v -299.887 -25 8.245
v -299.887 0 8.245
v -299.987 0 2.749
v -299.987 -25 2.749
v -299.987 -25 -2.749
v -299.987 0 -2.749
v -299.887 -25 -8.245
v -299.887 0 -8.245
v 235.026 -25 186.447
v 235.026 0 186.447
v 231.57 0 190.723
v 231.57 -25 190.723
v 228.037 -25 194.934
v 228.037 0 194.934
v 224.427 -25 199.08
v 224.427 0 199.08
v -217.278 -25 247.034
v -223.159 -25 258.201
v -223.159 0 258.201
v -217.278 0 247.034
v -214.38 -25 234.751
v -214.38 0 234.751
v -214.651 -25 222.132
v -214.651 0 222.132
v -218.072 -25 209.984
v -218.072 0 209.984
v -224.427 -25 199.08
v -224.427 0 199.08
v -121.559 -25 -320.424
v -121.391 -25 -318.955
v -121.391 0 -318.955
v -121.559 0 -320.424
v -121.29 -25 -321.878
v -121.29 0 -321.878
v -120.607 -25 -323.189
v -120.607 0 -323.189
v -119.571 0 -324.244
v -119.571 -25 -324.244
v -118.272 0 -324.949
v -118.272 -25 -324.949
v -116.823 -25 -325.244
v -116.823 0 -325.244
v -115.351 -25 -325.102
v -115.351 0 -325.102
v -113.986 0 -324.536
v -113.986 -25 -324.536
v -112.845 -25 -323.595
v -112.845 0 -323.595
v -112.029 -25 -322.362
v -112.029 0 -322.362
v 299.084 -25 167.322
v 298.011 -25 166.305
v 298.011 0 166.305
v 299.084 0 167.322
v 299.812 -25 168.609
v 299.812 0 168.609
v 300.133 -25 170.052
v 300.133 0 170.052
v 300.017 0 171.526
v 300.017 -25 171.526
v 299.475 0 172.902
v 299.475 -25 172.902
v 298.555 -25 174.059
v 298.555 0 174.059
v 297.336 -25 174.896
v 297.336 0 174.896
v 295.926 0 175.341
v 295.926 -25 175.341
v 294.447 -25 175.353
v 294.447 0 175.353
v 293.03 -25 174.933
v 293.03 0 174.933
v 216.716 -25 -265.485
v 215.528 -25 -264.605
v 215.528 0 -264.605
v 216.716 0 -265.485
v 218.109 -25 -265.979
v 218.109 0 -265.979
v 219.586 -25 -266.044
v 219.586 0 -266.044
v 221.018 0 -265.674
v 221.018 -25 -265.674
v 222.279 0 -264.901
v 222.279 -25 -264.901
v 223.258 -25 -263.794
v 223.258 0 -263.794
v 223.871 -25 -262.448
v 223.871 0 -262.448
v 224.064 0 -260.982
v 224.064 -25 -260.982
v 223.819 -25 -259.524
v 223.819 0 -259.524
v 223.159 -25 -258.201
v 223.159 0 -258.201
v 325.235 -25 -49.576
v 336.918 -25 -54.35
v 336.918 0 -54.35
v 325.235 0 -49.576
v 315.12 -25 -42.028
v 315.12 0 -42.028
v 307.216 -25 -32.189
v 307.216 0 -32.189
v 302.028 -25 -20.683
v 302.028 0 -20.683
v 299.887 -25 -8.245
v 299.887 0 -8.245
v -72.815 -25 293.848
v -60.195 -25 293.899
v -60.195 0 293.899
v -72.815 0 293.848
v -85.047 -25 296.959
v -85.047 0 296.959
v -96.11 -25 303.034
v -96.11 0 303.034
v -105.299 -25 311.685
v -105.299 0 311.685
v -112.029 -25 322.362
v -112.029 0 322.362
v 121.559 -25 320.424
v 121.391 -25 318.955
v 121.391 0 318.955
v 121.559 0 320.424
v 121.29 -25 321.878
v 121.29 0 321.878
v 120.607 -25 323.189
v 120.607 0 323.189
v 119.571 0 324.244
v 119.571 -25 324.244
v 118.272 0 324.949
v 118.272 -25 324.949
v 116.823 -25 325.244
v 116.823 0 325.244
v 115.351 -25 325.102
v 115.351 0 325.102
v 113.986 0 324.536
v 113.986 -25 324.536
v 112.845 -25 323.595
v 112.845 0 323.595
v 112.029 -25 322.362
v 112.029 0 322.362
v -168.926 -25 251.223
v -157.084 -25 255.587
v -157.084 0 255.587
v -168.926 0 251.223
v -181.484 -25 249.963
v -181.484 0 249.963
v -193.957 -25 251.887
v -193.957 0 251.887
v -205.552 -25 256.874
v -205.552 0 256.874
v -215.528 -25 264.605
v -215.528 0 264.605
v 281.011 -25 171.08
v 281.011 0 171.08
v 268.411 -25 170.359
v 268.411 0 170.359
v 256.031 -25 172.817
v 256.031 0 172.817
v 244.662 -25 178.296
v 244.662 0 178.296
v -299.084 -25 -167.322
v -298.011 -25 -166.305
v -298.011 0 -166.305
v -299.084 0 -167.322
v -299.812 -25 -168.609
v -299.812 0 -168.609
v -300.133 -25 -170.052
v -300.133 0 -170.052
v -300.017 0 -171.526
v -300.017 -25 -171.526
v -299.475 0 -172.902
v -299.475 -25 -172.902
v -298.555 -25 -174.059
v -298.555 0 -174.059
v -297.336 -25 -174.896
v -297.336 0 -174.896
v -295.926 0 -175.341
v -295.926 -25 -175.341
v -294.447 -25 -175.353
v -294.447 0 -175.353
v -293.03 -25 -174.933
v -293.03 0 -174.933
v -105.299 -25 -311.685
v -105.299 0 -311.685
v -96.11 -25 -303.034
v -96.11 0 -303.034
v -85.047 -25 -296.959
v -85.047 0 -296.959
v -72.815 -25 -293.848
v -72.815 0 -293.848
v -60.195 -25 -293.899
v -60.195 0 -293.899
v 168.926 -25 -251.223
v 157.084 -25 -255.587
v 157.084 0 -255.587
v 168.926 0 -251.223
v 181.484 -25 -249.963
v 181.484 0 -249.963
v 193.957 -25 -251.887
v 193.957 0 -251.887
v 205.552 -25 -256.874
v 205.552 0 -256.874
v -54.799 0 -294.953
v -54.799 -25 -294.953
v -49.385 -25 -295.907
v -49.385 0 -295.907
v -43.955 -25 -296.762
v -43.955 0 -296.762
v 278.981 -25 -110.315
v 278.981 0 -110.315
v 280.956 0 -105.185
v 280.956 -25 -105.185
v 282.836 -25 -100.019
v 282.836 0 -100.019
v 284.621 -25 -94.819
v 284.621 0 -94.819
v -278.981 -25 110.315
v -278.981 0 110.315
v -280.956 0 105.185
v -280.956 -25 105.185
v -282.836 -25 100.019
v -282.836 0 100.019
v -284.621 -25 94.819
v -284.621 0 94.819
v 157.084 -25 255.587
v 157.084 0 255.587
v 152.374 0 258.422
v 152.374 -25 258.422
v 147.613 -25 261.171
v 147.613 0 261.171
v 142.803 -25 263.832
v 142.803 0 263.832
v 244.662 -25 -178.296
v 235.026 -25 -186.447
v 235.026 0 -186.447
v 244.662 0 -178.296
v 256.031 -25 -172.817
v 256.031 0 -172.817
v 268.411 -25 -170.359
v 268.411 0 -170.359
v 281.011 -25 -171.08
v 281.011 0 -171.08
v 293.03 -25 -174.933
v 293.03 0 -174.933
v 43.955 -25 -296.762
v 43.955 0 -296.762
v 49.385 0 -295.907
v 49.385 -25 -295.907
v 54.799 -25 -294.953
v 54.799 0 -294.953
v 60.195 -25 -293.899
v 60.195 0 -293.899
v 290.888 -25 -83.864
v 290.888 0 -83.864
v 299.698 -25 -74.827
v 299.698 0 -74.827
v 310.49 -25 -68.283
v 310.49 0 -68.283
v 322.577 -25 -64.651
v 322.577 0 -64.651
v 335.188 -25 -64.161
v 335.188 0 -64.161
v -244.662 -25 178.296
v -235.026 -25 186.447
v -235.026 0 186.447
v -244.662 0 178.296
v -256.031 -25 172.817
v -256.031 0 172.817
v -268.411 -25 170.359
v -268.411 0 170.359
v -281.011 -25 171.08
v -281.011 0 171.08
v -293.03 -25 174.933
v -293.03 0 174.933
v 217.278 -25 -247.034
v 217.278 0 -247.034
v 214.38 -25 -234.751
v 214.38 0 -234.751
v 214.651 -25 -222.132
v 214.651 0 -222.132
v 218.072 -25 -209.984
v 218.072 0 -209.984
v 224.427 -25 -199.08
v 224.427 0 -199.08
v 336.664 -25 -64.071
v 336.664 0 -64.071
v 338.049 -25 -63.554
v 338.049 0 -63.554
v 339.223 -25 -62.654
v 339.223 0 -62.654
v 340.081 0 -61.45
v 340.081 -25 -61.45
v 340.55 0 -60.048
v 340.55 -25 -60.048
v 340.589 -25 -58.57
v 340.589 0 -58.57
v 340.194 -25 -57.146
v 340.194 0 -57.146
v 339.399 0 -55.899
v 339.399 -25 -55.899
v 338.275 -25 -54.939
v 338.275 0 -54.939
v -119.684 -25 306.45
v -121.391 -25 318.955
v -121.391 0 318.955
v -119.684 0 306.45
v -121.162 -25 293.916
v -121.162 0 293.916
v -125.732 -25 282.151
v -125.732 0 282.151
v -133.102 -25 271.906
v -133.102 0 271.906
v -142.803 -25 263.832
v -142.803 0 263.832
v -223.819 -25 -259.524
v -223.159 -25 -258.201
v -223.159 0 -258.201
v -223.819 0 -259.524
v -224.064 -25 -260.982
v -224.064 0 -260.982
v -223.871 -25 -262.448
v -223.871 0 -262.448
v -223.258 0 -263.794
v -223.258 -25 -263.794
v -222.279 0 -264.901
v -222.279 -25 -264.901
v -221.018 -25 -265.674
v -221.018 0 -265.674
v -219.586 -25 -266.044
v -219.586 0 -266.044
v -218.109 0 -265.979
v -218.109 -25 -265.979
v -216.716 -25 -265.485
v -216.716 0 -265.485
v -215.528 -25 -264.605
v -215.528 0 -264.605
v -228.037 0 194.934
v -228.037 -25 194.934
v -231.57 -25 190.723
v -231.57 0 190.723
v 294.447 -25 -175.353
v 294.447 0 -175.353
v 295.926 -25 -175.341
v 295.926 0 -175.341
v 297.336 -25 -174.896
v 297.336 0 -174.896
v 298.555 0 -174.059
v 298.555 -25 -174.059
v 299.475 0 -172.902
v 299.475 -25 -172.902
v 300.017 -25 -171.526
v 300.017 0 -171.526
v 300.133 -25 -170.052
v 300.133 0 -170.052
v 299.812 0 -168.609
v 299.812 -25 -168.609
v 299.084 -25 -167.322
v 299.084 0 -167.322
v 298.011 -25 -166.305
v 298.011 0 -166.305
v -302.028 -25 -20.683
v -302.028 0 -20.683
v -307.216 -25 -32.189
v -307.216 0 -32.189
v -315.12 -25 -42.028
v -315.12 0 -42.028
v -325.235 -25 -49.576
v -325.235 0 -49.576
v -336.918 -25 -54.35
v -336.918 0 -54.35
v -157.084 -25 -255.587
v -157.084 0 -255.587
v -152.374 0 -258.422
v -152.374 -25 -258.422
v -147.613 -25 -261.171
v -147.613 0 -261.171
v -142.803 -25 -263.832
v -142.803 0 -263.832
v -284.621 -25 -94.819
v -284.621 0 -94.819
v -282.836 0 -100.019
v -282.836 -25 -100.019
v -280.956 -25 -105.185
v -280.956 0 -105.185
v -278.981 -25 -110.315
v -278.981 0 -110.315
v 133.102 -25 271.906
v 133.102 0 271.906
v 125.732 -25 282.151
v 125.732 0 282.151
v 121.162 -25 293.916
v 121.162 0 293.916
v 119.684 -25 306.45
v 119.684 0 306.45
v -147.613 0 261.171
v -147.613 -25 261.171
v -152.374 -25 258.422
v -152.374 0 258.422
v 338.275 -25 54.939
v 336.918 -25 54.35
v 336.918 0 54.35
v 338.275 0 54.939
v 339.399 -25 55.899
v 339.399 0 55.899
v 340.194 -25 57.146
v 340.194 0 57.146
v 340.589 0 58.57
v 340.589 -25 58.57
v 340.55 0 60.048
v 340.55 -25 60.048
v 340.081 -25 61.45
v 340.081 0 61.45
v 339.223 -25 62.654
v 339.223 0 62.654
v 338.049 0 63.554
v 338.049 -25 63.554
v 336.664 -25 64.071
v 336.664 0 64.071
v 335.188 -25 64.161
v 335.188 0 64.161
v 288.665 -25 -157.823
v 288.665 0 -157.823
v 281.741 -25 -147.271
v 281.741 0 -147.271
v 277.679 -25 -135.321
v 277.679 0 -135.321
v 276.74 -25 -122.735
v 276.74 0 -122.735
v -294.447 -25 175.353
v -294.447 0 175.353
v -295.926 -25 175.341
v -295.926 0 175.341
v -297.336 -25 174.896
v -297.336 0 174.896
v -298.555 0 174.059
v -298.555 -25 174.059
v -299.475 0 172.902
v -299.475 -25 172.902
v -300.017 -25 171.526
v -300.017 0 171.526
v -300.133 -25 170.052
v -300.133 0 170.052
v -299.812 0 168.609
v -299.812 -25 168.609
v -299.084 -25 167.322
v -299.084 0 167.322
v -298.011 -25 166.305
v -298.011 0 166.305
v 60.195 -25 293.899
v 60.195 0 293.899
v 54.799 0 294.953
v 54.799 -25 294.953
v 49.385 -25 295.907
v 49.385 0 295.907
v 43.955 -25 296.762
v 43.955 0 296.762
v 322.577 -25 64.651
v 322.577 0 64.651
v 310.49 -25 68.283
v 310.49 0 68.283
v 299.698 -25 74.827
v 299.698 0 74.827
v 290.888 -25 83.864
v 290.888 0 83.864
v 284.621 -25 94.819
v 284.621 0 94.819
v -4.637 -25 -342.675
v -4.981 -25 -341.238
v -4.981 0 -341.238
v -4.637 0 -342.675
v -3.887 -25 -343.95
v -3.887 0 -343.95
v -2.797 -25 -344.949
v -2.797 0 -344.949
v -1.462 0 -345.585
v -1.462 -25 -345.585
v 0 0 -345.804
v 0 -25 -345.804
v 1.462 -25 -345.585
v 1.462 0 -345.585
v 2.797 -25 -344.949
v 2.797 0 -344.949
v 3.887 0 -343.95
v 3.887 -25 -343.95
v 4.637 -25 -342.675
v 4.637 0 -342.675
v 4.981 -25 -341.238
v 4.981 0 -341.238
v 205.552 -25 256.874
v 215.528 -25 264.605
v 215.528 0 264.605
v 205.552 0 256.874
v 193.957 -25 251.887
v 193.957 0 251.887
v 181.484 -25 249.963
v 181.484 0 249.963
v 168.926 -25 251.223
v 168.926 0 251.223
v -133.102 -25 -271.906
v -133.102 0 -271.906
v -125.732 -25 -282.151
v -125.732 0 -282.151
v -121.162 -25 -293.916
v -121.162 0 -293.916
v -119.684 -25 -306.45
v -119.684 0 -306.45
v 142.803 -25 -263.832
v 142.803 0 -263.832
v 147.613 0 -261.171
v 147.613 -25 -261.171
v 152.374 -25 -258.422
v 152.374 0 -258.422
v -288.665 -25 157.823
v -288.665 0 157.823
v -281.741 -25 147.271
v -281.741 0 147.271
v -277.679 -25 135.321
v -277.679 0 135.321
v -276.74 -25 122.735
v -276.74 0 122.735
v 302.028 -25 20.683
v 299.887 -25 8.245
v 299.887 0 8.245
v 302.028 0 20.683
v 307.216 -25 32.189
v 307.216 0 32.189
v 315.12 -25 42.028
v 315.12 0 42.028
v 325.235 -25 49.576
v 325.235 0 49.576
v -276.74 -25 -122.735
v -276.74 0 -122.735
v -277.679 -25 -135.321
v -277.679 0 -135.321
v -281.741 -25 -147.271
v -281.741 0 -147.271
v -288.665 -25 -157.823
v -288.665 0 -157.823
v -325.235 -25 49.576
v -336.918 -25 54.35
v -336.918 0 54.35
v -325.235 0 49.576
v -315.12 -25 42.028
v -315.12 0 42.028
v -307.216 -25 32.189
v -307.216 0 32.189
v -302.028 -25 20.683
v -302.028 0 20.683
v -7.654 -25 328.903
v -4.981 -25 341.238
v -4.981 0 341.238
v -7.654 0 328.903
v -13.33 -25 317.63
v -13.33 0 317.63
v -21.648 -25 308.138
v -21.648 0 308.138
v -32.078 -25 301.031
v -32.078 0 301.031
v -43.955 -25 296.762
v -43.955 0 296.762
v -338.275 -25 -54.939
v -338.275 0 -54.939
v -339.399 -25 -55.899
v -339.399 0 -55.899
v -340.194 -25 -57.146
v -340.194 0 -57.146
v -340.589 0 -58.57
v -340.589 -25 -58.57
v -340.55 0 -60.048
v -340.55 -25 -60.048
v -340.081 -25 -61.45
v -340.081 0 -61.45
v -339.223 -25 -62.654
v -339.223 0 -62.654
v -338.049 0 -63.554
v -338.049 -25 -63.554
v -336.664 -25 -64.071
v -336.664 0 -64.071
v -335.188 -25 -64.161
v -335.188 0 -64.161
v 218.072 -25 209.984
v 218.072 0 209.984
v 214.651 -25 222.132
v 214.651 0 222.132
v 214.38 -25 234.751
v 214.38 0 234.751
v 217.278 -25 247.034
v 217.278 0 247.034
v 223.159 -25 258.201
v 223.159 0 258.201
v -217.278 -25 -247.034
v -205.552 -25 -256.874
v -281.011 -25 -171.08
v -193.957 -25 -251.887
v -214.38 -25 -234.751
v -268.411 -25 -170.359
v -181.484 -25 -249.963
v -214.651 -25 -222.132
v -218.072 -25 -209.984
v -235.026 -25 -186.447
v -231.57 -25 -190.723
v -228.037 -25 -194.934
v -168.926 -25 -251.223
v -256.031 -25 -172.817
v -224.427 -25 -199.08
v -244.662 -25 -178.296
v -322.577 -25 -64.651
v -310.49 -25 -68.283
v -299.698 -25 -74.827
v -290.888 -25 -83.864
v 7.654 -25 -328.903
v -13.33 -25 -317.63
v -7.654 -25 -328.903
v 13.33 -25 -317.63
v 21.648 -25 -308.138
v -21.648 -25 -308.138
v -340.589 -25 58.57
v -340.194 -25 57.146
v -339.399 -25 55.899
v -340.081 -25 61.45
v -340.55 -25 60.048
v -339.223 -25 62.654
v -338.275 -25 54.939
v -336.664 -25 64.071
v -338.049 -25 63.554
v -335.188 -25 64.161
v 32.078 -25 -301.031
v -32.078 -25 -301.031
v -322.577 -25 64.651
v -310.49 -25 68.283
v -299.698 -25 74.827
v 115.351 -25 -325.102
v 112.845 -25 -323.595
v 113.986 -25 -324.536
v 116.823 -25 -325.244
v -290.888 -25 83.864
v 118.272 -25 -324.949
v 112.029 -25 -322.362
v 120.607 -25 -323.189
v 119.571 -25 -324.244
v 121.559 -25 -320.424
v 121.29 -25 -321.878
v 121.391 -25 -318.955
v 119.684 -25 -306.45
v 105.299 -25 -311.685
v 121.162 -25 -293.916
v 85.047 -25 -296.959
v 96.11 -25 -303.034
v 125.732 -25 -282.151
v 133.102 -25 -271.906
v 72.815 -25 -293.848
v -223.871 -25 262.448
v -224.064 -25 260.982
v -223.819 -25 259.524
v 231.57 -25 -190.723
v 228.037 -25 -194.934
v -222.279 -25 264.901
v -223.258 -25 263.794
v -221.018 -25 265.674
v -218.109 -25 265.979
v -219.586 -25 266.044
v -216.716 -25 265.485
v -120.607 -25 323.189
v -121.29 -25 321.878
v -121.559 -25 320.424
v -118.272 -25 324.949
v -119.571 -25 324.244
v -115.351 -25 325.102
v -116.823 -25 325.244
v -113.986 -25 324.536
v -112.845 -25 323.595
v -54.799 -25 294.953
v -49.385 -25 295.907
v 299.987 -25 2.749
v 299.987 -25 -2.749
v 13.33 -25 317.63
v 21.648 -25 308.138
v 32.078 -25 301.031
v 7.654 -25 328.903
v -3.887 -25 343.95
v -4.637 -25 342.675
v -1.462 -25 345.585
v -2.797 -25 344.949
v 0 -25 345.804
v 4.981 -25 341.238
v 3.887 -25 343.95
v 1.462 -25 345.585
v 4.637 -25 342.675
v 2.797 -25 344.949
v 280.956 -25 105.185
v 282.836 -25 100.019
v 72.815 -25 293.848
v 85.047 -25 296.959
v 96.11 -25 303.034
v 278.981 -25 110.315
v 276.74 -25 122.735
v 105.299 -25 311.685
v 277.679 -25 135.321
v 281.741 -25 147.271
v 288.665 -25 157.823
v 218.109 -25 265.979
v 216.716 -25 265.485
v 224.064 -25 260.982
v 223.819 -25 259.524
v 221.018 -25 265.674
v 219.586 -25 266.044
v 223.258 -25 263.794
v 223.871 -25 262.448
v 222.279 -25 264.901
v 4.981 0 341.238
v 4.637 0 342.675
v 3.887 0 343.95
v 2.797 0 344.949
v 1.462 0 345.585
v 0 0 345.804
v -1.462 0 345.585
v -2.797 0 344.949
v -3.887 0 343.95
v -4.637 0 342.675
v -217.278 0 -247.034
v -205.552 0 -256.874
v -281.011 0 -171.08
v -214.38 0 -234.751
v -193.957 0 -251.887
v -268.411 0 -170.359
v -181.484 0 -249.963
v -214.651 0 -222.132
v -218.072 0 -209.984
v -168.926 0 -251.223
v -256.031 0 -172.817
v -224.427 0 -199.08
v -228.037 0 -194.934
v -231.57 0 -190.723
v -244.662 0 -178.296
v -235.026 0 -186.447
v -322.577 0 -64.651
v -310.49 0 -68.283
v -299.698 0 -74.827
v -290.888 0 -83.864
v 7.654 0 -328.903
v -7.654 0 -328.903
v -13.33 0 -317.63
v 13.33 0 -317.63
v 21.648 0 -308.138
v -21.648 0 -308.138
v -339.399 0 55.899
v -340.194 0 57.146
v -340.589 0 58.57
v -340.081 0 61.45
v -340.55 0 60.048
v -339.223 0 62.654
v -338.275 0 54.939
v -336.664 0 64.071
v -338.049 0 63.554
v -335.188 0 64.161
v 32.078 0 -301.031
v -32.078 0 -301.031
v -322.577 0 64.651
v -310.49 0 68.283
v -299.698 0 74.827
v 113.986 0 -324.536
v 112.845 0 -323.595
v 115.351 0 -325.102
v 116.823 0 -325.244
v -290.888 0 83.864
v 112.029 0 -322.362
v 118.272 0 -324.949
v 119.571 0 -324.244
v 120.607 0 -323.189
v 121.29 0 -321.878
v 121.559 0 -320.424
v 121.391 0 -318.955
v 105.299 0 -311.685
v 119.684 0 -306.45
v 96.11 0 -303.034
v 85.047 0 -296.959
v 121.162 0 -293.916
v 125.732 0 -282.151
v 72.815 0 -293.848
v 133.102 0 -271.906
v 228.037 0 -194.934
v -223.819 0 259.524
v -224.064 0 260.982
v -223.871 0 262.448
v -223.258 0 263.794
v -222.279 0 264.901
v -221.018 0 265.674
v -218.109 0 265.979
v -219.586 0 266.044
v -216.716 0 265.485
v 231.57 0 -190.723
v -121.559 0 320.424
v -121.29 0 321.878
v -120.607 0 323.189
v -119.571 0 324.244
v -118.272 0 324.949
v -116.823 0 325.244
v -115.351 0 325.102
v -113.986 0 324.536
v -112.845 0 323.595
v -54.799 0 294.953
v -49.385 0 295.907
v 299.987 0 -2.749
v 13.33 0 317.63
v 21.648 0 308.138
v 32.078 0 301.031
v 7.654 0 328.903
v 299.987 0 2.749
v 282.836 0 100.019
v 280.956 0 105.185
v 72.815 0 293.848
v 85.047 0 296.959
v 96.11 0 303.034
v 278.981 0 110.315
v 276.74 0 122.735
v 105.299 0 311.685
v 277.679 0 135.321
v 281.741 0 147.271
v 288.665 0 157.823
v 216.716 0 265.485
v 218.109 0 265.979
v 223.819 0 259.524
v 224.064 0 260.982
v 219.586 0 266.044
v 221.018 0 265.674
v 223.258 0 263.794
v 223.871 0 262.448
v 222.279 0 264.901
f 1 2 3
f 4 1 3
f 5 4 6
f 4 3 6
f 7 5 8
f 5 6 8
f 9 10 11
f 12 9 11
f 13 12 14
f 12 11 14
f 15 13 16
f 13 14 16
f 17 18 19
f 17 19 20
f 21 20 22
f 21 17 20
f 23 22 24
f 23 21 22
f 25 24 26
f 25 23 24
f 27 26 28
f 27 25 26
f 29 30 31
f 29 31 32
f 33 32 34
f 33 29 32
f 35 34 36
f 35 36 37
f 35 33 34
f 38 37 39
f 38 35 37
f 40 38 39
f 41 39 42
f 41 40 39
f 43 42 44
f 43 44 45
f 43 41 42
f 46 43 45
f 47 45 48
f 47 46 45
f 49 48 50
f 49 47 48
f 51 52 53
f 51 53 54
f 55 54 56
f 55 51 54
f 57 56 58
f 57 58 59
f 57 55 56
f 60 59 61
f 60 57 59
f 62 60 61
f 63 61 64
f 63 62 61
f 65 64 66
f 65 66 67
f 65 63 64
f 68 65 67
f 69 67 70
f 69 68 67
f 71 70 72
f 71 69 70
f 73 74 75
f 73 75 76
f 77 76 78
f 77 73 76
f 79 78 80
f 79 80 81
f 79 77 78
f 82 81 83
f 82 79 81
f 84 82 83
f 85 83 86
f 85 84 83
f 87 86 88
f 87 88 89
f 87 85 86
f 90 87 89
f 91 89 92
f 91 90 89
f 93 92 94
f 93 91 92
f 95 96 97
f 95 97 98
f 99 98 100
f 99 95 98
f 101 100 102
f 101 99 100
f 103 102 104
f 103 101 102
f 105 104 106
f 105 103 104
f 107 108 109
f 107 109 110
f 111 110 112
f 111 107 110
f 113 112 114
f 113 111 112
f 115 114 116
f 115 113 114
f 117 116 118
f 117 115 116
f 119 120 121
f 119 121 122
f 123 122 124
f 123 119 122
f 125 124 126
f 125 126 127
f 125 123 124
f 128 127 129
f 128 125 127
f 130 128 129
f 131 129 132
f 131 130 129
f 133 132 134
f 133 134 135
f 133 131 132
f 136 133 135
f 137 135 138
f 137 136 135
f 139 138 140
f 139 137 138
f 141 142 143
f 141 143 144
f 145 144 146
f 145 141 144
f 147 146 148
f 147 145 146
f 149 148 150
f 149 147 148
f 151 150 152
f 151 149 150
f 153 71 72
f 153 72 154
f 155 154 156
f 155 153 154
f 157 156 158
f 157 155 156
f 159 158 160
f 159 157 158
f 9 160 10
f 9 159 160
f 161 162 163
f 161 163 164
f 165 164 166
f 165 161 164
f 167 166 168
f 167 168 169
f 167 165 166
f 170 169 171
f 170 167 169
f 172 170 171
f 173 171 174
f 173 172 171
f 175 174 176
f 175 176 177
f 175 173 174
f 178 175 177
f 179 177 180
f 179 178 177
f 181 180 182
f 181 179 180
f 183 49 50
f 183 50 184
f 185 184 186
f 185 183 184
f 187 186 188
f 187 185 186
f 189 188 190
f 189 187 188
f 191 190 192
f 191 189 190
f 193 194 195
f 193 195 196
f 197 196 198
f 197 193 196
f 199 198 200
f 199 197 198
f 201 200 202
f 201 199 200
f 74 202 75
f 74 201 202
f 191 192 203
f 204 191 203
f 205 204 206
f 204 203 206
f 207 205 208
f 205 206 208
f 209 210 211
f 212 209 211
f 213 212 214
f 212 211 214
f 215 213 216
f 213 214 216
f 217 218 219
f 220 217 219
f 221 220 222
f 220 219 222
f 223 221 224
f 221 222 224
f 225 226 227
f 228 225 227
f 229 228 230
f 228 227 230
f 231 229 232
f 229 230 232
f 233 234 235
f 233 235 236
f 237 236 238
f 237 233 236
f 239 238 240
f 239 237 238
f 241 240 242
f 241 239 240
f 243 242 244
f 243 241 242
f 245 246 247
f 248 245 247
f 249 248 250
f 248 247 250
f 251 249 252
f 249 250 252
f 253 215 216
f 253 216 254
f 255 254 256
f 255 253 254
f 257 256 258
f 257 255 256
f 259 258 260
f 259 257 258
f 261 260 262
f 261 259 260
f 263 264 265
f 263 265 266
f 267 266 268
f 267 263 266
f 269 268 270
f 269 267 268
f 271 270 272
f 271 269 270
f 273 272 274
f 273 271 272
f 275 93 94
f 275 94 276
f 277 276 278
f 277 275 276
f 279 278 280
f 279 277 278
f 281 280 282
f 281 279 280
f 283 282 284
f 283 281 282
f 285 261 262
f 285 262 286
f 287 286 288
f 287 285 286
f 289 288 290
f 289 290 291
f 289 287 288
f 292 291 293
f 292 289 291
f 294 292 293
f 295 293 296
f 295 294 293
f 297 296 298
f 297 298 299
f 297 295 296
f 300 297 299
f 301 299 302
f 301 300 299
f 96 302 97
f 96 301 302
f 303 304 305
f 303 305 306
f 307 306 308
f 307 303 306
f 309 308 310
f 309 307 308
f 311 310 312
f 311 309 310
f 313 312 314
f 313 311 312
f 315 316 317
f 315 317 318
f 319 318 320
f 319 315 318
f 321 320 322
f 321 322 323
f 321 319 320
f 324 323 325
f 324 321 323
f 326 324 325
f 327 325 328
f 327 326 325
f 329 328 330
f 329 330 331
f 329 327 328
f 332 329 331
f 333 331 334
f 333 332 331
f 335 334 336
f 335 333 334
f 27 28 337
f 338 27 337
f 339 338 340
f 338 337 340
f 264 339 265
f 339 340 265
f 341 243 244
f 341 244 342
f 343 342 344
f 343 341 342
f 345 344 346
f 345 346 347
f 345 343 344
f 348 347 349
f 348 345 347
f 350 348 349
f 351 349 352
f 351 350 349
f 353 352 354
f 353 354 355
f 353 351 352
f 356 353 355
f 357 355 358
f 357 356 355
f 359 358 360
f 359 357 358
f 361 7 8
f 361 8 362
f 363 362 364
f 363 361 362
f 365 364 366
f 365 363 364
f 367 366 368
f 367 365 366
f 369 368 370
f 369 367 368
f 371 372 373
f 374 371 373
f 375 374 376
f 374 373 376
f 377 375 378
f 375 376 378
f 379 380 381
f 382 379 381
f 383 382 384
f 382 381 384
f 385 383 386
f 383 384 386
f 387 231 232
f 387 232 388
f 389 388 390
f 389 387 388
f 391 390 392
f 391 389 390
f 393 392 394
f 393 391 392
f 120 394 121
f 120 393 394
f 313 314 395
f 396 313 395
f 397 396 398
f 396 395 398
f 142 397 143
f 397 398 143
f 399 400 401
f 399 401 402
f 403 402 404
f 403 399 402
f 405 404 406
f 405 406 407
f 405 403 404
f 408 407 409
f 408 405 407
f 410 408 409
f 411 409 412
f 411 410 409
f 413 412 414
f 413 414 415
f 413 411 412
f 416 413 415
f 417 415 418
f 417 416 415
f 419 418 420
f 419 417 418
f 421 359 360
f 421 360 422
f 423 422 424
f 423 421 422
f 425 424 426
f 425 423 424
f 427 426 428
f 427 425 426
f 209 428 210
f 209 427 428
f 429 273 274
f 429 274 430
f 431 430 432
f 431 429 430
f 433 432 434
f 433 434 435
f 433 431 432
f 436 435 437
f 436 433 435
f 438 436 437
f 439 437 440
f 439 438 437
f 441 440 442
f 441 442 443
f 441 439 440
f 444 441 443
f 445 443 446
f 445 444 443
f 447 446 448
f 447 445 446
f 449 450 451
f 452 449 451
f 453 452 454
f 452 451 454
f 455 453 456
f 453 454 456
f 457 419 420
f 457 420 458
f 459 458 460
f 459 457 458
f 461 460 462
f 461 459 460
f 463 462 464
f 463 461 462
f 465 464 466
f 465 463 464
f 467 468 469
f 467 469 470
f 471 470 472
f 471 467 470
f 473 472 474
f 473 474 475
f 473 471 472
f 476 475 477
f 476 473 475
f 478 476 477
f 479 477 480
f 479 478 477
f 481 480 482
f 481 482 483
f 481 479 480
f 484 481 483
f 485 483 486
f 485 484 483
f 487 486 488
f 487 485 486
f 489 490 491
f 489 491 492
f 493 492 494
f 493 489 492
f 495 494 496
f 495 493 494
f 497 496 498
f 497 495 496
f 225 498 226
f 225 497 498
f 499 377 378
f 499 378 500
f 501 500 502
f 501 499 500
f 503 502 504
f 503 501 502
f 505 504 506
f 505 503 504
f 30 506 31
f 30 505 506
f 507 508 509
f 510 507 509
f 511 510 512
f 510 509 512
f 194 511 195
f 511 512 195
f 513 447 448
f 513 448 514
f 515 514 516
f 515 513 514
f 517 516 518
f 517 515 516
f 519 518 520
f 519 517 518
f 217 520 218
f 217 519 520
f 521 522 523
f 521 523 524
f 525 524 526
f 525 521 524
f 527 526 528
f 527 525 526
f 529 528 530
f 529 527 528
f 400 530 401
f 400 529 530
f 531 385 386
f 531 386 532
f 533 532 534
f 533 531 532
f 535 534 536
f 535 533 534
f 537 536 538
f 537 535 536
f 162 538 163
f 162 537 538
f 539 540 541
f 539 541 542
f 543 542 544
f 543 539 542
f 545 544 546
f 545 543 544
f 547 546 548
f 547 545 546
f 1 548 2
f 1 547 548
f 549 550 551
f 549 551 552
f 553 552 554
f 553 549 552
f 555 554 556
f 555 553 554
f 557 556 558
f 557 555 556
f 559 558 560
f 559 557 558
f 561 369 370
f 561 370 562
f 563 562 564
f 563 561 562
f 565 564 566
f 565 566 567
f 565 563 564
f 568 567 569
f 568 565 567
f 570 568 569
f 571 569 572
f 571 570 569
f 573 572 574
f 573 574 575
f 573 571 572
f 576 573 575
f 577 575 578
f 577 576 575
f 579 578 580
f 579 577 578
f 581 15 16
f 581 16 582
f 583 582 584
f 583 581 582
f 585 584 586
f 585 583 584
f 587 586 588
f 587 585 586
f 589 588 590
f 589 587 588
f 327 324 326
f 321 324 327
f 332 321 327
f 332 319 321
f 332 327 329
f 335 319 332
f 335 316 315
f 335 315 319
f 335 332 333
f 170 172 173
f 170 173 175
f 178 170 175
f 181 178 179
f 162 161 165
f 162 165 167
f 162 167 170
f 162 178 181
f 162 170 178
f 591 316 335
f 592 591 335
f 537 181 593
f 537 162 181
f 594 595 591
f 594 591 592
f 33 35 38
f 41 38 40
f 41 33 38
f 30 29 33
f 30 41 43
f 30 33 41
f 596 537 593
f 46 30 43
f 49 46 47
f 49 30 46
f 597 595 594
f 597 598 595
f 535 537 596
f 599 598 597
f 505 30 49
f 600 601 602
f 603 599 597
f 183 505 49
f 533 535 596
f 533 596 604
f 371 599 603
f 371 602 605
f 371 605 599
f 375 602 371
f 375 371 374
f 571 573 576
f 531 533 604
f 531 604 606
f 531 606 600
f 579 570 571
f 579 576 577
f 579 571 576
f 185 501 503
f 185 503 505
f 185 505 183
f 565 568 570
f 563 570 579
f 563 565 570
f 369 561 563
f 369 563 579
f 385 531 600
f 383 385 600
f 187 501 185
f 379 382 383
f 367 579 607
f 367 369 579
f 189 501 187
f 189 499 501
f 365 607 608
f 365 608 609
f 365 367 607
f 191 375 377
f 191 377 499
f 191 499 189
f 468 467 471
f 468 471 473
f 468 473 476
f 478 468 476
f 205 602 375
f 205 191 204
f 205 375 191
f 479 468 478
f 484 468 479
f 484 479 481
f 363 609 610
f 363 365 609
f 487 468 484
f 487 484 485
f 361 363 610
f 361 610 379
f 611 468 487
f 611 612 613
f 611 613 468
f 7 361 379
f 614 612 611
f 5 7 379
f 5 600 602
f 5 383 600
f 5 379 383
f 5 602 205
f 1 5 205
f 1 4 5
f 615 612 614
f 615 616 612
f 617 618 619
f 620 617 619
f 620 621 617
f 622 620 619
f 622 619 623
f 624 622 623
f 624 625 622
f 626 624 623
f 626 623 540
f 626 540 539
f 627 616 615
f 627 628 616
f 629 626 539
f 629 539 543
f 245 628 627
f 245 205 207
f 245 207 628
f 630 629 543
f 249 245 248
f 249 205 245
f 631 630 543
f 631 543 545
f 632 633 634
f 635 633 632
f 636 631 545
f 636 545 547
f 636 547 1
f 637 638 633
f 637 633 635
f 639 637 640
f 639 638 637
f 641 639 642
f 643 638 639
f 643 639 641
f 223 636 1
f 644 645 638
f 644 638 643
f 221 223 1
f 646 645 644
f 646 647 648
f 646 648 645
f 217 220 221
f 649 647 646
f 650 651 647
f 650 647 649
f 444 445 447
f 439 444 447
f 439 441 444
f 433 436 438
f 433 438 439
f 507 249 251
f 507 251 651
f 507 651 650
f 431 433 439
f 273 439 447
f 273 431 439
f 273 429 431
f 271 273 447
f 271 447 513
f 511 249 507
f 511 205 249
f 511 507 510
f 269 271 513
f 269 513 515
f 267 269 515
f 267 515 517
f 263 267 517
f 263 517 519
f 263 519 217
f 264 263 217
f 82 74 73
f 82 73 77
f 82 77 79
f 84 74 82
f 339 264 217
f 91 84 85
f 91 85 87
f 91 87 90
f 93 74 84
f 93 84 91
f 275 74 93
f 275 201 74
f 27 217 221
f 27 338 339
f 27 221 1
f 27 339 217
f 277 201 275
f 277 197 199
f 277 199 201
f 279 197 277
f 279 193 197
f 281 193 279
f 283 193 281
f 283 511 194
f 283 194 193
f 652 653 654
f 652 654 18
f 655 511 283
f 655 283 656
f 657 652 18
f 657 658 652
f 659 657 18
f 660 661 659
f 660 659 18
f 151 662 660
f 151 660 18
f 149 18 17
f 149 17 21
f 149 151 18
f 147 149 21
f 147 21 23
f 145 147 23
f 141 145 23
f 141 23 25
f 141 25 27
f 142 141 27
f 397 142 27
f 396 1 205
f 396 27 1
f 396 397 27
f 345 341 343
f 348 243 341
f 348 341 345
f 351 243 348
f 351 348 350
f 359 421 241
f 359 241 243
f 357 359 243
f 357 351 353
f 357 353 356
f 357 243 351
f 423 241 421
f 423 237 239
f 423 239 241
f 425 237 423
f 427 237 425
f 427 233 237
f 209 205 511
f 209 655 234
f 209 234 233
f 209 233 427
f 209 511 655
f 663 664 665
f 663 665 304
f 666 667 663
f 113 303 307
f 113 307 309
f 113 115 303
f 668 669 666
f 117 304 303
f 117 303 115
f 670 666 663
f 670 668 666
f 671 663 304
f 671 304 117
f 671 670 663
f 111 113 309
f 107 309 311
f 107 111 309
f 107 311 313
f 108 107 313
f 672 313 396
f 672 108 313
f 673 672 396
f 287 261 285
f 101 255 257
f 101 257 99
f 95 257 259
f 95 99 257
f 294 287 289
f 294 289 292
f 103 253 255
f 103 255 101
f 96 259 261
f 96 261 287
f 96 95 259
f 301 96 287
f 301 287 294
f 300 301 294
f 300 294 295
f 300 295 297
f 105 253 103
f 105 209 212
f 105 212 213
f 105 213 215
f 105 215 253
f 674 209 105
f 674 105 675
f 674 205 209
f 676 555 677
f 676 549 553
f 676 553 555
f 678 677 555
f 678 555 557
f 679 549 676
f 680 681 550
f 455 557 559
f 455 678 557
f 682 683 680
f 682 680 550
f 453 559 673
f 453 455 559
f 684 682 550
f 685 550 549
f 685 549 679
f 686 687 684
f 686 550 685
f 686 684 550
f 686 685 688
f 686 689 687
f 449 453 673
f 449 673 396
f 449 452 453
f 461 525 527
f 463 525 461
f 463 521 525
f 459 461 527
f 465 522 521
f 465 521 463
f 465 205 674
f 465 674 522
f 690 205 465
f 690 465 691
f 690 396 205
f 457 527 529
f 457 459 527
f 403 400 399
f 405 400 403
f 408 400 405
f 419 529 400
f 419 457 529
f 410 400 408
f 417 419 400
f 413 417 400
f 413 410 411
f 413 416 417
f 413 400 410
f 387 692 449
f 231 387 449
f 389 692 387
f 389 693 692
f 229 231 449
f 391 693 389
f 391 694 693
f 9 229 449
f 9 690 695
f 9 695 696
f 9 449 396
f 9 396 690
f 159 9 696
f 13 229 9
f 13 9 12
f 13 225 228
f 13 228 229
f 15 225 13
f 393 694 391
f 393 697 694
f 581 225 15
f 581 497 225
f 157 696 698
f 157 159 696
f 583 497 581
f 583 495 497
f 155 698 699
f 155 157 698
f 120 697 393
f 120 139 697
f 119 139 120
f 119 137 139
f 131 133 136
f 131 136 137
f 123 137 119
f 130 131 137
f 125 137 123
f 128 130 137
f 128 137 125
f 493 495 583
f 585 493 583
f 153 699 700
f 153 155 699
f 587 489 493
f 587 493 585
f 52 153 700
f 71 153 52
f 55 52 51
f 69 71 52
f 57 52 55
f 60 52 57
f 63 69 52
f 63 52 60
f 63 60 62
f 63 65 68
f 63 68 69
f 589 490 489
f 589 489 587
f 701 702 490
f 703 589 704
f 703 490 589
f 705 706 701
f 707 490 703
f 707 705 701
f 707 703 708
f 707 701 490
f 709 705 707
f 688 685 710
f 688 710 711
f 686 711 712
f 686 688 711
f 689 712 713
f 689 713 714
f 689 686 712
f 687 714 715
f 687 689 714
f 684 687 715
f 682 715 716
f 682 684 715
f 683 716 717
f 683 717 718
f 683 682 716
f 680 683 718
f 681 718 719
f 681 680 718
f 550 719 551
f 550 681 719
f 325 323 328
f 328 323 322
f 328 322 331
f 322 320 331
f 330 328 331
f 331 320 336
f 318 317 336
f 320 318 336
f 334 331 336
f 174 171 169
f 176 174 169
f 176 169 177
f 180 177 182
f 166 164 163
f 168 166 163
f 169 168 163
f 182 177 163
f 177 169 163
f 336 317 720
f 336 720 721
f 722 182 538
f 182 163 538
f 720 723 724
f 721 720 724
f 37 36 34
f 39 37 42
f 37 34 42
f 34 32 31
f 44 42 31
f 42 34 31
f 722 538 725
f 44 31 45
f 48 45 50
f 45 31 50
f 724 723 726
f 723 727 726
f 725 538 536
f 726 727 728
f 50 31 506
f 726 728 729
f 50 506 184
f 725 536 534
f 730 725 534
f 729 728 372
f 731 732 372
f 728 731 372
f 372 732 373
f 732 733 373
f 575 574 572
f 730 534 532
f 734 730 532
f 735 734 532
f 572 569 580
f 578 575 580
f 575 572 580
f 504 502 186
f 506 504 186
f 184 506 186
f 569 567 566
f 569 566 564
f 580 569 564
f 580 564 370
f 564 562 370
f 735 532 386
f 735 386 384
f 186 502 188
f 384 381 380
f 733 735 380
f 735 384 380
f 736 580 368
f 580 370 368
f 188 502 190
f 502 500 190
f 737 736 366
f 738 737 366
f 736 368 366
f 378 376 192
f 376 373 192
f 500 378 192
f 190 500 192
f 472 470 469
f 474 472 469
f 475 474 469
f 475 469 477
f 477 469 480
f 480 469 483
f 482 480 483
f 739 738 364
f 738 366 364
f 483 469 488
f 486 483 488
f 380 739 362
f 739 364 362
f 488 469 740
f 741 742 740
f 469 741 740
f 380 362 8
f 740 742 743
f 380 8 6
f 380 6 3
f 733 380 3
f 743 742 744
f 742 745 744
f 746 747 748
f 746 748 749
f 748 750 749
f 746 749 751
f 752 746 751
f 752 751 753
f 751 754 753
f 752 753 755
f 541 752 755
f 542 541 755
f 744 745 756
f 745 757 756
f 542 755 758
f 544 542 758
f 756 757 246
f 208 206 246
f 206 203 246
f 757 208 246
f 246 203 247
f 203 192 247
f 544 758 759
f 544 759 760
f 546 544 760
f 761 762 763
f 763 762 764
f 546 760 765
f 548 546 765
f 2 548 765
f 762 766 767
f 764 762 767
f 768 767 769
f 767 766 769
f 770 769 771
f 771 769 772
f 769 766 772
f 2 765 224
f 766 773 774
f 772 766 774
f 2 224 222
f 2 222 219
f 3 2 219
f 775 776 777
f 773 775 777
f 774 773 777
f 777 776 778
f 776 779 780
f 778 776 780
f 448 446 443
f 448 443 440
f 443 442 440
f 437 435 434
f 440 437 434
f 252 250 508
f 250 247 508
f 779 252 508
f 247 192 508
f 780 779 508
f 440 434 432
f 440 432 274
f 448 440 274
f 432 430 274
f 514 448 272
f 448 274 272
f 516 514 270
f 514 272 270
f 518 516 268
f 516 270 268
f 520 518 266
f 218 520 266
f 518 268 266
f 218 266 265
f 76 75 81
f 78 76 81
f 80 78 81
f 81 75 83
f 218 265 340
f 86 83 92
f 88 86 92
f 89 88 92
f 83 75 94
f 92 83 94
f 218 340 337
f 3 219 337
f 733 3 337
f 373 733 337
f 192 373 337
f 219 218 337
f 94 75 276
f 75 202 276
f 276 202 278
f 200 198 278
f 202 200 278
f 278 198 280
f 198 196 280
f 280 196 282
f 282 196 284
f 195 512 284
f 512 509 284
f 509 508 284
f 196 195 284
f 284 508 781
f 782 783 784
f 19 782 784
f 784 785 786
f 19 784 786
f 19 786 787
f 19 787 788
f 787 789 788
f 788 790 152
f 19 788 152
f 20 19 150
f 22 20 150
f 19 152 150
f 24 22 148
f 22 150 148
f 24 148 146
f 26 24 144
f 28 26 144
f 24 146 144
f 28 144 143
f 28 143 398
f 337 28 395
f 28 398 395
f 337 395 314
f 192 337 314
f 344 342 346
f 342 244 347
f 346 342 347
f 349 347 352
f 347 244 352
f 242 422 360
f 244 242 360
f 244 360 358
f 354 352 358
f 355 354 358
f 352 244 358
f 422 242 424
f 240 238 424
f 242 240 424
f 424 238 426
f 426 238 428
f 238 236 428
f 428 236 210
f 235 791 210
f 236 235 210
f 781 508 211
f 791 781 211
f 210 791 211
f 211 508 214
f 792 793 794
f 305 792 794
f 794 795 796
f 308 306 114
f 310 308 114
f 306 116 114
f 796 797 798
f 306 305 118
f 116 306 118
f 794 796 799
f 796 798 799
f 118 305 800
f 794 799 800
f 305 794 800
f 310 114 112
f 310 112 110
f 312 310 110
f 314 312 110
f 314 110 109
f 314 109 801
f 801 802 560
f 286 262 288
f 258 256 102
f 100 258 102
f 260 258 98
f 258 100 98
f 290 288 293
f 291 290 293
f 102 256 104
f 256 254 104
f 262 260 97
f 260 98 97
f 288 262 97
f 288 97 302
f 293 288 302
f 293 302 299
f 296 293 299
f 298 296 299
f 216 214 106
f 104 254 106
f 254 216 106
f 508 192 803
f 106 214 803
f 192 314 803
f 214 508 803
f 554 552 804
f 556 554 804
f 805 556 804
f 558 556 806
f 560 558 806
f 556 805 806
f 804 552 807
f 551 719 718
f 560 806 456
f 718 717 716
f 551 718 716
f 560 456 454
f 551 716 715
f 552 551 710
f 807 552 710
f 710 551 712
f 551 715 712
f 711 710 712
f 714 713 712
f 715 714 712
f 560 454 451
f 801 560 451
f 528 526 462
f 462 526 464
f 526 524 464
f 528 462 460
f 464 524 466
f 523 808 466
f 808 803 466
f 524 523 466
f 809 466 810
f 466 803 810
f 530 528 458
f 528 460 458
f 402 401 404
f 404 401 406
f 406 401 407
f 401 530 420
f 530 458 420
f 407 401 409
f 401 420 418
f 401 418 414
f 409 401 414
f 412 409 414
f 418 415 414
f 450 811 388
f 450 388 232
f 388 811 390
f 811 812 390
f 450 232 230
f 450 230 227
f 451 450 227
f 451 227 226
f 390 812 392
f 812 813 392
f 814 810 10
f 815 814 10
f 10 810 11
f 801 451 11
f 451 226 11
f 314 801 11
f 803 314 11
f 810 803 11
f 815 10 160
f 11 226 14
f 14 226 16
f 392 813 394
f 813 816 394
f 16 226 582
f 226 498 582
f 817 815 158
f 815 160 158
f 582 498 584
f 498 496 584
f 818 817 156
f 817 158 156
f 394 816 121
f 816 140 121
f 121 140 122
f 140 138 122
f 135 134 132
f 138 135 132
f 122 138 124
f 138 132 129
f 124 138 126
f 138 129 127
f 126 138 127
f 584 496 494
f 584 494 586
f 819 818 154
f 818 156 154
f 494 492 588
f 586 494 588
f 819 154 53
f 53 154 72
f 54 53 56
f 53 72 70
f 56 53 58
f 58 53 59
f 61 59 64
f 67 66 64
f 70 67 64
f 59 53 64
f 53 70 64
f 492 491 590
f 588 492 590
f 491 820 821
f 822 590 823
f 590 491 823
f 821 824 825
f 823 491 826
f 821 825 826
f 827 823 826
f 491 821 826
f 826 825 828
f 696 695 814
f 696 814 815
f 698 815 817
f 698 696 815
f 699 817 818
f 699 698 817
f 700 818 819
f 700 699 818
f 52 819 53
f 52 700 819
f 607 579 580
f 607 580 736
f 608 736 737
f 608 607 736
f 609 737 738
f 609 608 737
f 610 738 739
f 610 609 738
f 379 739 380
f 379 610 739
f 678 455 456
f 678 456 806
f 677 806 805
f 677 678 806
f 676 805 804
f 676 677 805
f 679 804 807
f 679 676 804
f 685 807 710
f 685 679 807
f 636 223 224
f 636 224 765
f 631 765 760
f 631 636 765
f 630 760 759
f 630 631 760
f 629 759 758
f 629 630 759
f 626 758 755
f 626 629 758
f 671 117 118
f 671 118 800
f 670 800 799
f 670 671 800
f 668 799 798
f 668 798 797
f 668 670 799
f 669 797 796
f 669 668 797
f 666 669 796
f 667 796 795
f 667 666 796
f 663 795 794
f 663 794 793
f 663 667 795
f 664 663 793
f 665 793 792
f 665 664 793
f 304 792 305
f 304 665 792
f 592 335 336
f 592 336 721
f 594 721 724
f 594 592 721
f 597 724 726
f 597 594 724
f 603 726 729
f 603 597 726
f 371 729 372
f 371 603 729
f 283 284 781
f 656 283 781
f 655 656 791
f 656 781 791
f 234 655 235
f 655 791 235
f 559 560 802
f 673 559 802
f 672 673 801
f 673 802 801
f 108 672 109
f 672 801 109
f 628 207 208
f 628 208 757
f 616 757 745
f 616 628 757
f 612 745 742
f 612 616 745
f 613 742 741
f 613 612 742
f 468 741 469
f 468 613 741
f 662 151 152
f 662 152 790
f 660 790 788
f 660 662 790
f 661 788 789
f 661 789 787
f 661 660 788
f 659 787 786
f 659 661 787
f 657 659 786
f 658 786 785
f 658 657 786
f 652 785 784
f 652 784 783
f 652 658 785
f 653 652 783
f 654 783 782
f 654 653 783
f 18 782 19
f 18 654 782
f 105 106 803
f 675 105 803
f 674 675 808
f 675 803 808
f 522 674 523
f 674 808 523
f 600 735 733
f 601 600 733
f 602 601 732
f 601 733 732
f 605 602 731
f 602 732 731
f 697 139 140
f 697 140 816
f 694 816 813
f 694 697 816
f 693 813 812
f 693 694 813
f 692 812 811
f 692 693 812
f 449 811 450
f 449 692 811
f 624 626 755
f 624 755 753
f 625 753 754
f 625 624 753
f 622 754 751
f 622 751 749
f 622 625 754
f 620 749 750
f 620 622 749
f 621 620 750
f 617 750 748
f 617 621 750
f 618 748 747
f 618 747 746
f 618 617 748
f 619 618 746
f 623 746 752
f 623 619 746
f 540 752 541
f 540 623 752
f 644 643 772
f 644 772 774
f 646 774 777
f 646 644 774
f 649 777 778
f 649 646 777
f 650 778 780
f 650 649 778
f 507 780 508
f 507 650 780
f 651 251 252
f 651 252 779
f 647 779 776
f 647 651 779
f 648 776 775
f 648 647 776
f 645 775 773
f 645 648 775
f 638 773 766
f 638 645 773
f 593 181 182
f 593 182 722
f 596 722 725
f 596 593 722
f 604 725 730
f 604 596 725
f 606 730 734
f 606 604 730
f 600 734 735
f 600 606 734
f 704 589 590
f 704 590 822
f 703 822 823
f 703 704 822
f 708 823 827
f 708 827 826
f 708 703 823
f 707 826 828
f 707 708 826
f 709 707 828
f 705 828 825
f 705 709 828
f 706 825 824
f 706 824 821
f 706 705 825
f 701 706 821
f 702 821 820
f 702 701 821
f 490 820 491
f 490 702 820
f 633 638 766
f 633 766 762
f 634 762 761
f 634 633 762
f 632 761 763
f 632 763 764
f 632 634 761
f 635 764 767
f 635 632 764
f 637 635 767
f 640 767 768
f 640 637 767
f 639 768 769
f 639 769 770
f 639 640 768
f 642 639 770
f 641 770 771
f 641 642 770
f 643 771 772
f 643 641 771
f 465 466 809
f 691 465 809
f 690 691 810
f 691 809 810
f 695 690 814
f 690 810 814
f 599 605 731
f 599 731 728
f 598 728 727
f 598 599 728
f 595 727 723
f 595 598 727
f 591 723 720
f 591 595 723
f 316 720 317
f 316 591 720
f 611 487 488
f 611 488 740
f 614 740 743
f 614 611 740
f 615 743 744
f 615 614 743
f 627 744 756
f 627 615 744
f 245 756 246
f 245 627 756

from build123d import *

# Parameters (mm, degrees)
F0_R            = 300
F1_DEPTH        = 25
F3_DEPTH        = 25
F3_COPIES_COUNT = 18


# Not quite as in the source:
# - a pattern or mirror of a feature is missing from the dataset's text; its kind, count and spacing are read off the source's solid


with BuildPart() as f1:
    # F0 (on Front) → F1 (new body)
    with BuildSketch(Plane.XZ):
        Circle(F0_R)
    extrude(amount=F1_DEPTH)

    # F2 (on face) → F3 (join, through all)
    with BuildSketch(Plane.XZ.offset(25)):
        with BuildLine():
            ThreePointArc((43.9549568499, 296.7624669131), (46.962798618, 296.1906436564), (50, 295.803989155))
            ThreePointArc((50, 295.803989155), (46.9799228296, 296.2986446998), (43.9549568499, 296.7624669131))
        make_face()
        with BuildLine():
            ThreePointArc((-50, 295.803989155), (-46.962798618, 296.1906436564), (-43.9549568499, 296.7624669131))
            ThreePointArc((-43.9549568499, 296.7624669131), (-46.9799228296, 296.2986446998), (-50, 295.803989155))
        make_face()
        with BuildLine():
            ThreePointArc((-43.9549568499, 296.7624669131), (0, 300), (43.9549568499, 296.7624669131))
            ThreePointArc((43.9549568499, 296.7624669131), (17.1882851118, 312.6207310432), (4.9811623415, 341.2376038778))
            ThreePointArc((4.9811623415, 341.2376038778), (0, 345.803989155), (-4.9811623415, 341.2376038778))
            ThreePointArc((-4.9811623415, 341.2376038778), (-17.1882851118, 312.6207310432), (-43.9549568499, 296.7624669131))
        make_face()
    f3 = extrude(amount=-F3_DEPTH)

    # F3_copies: F3 ×18 about axis
    f3_copies_axis = Axis((0, 0, 0), (0, 1, 0))
    for i in range(1, F3_COPIES_COUNT):
        add(f3.rotate(f3_copies_axis, i * 360 / F3_COPIES_COUNT))


solid = f1.part
